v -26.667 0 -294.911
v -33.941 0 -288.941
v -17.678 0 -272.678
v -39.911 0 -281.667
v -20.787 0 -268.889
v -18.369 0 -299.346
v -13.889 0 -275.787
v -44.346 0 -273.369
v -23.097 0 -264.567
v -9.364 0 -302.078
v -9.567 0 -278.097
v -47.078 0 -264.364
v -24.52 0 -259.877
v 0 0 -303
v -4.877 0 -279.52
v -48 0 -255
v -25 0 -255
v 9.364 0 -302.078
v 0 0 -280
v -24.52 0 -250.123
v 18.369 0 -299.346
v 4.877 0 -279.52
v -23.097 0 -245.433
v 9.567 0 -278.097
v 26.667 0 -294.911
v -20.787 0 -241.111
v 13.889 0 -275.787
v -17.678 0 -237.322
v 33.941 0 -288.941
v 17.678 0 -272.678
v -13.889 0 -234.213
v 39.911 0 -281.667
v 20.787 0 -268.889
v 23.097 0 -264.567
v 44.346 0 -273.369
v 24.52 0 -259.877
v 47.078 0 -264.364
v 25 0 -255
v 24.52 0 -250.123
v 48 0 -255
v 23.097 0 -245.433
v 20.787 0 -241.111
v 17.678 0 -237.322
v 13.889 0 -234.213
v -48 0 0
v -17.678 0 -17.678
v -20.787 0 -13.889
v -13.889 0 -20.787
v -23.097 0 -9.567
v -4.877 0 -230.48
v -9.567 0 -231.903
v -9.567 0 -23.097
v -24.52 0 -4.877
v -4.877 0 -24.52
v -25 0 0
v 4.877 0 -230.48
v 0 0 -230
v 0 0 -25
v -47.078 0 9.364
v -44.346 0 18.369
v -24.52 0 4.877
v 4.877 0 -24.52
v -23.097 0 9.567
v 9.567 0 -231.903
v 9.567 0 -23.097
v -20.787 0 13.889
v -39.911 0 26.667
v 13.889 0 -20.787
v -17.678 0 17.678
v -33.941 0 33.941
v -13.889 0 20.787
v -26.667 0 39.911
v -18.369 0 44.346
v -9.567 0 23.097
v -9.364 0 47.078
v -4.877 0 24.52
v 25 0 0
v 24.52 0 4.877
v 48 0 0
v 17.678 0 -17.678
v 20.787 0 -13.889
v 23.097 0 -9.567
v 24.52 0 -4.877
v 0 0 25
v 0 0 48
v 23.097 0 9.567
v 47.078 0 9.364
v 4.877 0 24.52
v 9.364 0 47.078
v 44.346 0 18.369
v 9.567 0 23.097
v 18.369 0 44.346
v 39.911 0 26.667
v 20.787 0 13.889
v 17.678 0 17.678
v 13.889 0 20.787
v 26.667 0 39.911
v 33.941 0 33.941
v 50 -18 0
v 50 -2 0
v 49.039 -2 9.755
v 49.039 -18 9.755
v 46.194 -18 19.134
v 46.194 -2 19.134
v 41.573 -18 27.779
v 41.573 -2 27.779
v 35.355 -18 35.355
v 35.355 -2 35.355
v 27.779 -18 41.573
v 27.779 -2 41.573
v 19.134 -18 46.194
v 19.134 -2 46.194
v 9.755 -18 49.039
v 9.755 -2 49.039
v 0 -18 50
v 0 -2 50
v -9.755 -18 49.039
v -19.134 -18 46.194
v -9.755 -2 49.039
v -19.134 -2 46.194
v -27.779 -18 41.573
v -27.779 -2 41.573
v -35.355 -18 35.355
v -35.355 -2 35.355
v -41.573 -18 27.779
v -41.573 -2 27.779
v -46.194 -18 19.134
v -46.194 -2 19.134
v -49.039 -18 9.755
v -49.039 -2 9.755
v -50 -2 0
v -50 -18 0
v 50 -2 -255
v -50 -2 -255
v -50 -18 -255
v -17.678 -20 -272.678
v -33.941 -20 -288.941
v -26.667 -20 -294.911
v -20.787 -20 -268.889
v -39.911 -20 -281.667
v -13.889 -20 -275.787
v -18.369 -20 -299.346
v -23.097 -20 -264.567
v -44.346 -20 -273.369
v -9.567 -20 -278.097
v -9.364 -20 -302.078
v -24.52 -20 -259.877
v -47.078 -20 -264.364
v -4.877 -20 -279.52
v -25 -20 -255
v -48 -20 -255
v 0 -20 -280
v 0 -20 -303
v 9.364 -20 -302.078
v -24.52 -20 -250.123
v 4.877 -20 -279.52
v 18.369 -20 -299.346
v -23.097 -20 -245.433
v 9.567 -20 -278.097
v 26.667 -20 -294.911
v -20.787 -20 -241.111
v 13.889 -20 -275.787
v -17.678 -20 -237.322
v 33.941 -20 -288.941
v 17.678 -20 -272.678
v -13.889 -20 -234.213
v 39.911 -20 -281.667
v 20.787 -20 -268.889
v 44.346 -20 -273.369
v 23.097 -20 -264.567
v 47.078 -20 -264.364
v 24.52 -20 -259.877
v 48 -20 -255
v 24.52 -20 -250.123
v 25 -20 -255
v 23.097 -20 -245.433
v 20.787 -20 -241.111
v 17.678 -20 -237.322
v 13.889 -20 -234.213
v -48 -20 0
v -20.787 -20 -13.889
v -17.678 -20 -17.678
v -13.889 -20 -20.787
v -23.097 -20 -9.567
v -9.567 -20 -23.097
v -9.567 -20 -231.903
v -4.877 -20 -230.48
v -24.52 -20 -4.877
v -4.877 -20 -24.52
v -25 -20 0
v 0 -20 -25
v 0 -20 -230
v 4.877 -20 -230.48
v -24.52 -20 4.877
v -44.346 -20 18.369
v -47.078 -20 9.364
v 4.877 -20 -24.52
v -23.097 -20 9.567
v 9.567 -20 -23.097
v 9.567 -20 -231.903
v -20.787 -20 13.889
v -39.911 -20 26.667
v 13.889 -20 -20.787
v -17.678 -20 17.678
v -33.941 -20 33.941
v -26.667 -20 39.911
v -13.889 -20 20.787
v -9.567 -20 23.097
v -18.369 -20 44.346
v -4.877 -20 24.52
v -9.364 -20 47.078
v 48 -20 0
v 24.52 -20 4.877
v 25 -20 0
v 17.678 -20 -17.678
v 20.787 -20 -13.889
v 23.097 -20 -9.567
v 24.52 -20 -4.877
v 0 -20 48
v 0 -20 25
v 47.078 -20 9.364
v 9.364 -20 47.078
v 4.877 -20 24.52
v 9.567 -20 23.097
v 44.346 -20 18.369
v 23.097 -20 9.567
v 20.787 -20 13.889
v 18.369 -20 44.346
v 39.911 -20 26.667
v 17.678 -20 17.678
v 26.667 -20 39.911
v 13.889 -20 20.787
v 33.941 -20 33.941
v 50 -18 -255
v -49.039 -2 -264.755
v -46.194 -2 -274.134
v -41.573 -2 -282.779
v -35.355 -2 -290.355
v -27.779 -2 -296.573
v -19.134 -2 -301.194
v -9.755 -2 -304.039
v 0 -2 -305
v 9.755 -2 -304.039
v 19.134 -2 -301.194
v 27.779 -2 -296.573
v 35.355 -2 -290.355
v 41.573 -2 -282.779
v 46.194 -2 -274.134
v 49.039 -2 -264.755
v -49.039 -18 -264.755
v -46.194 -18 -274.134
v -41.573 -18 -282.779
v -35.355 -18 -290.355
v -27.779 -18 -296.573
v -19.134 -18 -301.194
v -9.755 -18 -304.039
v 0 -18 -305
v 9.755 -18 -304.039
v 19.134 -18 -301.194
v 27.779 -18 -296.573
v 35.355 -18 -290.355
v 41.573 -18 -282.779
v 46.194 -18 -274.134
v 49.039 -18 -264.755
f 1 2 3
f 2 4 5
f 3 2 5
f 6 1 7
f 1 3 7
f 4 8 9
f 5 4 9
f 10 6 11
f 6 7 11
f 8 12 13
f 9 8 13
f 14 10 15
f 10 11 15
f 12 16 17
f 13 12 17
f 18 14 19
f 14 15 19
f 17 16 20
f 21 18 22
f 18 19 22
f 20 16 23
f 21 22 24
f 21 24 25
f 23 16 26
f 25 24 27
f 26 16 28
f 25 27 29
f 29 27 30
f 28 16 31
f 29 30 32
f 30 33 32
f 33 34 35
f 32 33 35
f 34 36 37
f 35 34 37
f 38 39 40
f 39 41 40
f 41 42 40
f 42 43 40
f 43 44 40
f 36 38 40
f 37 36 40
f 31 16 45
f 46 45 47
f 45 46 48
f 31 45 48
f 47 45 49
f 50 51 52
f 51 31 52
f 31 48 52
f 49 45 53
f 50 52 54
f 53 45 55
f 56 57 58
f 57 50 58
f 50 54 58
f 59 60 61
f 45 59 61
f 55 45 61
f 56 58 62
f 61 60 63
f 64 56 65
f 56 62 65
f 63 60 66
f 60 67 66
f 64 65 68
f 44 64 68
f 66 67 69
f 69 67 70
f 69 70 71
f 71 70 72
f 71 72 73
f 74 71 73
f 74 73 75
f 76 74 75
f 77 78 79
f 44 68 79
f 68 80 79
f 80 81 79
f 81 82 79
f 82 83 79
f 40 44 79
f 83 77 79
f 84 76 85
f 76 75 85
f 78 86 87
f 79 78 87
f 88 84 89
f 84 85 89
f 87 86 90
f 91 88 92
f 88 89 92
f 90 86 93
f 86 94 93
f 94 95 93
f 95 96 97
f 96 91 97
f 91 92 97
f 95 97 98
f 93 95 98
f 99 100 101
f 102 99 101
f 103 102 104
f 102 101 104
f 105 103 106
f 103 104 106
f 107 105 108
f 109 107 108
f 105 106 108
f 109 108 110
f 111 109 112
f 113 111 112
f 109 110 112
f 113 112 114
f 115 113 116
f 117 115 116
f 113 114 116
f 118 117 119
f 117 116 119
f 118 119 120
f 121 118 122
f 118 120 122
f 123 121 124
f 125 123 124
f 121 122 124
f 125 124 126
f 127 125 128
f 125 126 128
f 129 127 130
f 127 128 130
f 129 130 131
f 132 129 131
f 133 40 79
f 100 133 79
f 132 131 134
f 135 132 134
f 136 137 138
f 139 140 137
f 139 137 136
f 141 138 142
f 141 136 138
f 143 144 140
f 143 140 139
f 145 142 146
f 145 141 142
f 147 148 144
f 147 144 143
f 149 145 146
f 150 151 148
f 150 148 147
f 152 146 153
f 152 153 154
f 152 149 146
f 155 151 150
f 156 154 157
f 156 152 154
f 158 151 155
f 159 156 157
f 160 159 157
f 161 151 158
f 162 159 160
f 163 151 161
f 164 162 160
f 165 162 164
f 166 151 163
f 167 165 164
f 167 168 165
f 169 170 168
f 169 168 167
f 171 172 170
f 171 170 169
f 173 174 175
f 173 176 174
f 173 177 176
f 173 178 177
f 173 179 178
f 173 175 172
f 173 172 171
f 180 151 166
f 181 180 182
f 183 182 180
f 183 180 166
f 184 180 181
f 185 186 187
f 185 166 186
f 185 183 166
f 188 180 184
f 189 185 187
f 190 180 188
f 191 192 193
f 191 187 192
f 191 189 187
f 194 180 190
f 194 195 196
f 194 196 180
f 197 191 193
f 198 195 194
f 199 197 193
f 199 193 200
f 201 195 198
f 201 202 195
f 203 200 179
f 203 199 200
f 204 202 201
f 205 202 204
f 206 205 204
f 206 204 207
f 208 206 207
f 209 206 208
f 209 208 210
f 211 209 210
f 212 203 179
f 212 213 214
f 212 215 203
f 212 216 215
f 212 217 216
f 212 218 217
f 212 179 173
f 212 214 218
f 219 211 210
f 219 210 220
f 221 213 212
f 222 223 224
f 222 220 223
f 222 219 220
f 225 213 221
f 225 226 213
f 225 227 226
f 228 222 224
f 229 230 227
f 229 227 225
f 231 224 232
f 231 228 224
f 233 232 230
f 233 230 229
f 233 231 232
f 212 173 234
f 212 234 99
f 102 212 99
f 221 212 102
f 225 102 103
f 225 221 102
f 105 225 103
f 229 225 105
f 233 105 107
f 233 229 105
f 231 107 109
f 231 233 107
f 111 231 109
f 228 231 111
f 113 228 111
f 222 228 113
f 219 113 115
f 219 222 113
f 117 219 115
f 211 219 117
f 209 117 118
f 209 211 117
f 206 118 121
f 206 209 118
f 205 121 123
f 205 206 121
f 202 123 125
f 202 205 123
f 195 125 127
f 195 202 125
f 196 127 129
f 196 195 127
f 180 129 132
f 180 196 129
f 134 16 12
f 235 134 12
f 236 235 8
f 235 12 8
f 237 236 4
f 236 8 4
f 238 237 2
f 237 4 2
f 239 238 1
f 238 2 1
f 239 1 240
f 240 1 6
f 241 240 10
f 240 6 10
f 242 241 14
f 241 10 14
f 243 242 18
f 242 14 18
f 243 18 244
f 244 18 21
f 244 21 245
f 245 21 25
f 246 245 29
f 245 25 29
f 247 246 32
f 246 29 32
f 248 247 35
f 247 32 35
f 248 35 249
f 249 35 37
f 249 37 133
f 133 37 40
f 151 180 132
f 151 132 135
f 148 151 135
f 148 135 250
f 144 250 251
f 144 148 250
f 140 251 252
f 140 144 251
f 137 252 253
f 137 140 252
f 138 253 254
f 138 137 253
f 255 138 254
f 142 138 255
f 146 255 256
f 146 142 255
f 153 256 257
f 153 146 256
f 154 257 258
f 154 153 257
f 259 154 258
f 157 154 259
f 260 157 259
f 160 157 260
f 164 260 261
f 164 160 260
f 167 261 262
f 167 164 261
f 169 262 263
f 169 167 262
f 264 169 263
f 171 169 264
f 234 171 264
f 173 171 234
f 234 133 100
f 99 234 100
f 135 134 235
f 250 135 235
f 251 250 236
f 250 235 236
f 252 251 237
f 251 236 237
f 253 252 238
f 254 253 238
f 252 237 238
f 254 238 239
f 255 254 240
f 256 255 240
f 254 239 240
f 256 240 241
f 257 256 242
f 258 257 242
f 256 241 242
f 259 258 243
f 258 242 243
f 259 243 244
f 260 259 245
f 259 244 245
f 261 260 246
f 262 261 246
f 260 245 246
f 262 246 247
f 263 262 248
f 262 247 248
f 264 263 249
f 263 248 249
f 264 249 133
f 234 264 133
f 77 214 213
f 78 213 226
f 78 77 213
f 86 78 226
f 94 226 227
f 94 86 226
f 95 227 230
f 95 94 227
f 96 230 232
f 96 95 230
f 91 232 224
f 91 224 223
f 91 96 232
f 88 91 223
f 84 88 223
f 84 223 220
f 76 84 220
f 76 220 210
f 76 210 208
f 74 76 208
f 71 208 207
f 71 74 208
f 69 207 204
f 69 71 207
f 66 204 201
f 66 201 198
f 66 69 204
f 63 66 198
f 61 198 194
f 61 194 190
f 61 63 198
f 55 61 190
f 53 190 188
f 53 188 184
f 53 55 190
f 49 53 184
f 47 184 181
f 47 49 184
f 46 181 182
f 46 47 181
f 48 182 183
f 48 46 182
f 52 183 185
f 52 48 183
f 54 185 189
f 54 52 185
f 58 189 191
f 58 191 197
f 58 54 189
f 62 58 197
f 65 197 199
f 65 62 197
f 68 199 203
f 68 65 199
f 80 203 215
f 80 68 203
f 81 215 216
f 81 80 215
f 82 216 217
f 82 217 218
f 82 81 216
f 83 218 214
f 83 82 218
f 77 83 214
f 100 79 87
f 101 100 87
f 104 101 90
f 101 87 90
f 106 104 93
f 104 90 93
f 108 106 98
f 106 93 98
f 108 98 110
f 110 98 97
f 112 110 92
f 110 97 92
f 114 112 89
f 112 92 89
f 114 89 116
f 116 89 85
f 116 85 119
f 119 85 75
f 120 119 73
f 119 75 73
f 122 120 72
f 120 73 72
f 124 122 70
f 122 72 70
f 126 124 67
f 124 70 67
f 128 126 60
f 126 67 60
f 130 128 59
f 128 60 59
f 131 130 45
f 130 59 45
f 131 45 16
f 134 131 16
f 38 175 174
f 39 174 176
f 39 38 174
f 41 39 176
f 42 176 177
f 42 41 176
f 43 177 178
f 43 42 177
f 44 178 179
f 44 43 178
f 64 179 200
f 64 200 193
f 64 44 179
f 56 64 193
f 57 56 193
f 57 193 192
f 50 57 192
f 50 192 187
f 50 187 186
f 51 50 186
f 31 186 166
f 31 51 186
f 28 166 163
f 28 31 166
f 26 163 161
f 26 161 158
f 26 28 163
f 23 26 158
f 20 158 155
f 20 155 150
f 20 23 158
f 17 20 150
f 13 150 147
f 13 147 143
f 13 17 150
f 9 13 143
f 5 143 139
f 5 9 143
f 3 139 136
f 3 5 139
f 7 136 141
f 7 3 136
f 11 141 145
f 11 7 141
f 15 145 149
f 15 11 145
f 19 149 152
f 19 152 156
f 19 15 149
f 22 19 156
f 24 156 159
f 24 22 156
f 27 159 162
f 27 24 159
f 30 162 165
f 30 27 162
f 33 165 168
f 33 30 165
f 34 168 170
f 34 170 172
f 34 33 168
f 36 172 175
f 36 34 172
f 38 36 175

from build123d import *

# Parameters (mm, degrees)
F0_R     = 25
F1_DEPTH = 20
F2_SIZE2 = 2
F2_SIZE  = 2


with BuildPart() as f1:
    # F0 (on Front) → F1 (new body)
    with BuildSketch(Plane.XZ):
        with BuildLine():
            ThreePointArc((50, 0), (0, 50), (-50, 0))
            Line((-50, 0), (-50, -255))
            ThreePointArc((-50, -255), (0, -305), (50, -255))
            Line((50, -255), (50, 0))
        make_face()
        with Locations((0, -255)):
            Circle(F0_R, mode=Mode.SUBTRACT)
        Circle(F0_R, mode=Mode.SUBTRACT)
    extrude(amount=F1_DEPTH)

    # F2
    f2_edges = [f1.edges().sort_by_distance(p)[0] for p in [
        (-50, -20, -127.5),
        (0, -20, 50),
        (50, -20, -127.5),
        (0, -20, -305),
        (0, 0, -305),
        (-50, 0, -127.5),
        (0, 0, 50),
        (50, 0, -127.5),
    ]]
    chamfer(f2_edges, length=F2_SIZE, length2=F2_SIZE2)


solid = f1.part
